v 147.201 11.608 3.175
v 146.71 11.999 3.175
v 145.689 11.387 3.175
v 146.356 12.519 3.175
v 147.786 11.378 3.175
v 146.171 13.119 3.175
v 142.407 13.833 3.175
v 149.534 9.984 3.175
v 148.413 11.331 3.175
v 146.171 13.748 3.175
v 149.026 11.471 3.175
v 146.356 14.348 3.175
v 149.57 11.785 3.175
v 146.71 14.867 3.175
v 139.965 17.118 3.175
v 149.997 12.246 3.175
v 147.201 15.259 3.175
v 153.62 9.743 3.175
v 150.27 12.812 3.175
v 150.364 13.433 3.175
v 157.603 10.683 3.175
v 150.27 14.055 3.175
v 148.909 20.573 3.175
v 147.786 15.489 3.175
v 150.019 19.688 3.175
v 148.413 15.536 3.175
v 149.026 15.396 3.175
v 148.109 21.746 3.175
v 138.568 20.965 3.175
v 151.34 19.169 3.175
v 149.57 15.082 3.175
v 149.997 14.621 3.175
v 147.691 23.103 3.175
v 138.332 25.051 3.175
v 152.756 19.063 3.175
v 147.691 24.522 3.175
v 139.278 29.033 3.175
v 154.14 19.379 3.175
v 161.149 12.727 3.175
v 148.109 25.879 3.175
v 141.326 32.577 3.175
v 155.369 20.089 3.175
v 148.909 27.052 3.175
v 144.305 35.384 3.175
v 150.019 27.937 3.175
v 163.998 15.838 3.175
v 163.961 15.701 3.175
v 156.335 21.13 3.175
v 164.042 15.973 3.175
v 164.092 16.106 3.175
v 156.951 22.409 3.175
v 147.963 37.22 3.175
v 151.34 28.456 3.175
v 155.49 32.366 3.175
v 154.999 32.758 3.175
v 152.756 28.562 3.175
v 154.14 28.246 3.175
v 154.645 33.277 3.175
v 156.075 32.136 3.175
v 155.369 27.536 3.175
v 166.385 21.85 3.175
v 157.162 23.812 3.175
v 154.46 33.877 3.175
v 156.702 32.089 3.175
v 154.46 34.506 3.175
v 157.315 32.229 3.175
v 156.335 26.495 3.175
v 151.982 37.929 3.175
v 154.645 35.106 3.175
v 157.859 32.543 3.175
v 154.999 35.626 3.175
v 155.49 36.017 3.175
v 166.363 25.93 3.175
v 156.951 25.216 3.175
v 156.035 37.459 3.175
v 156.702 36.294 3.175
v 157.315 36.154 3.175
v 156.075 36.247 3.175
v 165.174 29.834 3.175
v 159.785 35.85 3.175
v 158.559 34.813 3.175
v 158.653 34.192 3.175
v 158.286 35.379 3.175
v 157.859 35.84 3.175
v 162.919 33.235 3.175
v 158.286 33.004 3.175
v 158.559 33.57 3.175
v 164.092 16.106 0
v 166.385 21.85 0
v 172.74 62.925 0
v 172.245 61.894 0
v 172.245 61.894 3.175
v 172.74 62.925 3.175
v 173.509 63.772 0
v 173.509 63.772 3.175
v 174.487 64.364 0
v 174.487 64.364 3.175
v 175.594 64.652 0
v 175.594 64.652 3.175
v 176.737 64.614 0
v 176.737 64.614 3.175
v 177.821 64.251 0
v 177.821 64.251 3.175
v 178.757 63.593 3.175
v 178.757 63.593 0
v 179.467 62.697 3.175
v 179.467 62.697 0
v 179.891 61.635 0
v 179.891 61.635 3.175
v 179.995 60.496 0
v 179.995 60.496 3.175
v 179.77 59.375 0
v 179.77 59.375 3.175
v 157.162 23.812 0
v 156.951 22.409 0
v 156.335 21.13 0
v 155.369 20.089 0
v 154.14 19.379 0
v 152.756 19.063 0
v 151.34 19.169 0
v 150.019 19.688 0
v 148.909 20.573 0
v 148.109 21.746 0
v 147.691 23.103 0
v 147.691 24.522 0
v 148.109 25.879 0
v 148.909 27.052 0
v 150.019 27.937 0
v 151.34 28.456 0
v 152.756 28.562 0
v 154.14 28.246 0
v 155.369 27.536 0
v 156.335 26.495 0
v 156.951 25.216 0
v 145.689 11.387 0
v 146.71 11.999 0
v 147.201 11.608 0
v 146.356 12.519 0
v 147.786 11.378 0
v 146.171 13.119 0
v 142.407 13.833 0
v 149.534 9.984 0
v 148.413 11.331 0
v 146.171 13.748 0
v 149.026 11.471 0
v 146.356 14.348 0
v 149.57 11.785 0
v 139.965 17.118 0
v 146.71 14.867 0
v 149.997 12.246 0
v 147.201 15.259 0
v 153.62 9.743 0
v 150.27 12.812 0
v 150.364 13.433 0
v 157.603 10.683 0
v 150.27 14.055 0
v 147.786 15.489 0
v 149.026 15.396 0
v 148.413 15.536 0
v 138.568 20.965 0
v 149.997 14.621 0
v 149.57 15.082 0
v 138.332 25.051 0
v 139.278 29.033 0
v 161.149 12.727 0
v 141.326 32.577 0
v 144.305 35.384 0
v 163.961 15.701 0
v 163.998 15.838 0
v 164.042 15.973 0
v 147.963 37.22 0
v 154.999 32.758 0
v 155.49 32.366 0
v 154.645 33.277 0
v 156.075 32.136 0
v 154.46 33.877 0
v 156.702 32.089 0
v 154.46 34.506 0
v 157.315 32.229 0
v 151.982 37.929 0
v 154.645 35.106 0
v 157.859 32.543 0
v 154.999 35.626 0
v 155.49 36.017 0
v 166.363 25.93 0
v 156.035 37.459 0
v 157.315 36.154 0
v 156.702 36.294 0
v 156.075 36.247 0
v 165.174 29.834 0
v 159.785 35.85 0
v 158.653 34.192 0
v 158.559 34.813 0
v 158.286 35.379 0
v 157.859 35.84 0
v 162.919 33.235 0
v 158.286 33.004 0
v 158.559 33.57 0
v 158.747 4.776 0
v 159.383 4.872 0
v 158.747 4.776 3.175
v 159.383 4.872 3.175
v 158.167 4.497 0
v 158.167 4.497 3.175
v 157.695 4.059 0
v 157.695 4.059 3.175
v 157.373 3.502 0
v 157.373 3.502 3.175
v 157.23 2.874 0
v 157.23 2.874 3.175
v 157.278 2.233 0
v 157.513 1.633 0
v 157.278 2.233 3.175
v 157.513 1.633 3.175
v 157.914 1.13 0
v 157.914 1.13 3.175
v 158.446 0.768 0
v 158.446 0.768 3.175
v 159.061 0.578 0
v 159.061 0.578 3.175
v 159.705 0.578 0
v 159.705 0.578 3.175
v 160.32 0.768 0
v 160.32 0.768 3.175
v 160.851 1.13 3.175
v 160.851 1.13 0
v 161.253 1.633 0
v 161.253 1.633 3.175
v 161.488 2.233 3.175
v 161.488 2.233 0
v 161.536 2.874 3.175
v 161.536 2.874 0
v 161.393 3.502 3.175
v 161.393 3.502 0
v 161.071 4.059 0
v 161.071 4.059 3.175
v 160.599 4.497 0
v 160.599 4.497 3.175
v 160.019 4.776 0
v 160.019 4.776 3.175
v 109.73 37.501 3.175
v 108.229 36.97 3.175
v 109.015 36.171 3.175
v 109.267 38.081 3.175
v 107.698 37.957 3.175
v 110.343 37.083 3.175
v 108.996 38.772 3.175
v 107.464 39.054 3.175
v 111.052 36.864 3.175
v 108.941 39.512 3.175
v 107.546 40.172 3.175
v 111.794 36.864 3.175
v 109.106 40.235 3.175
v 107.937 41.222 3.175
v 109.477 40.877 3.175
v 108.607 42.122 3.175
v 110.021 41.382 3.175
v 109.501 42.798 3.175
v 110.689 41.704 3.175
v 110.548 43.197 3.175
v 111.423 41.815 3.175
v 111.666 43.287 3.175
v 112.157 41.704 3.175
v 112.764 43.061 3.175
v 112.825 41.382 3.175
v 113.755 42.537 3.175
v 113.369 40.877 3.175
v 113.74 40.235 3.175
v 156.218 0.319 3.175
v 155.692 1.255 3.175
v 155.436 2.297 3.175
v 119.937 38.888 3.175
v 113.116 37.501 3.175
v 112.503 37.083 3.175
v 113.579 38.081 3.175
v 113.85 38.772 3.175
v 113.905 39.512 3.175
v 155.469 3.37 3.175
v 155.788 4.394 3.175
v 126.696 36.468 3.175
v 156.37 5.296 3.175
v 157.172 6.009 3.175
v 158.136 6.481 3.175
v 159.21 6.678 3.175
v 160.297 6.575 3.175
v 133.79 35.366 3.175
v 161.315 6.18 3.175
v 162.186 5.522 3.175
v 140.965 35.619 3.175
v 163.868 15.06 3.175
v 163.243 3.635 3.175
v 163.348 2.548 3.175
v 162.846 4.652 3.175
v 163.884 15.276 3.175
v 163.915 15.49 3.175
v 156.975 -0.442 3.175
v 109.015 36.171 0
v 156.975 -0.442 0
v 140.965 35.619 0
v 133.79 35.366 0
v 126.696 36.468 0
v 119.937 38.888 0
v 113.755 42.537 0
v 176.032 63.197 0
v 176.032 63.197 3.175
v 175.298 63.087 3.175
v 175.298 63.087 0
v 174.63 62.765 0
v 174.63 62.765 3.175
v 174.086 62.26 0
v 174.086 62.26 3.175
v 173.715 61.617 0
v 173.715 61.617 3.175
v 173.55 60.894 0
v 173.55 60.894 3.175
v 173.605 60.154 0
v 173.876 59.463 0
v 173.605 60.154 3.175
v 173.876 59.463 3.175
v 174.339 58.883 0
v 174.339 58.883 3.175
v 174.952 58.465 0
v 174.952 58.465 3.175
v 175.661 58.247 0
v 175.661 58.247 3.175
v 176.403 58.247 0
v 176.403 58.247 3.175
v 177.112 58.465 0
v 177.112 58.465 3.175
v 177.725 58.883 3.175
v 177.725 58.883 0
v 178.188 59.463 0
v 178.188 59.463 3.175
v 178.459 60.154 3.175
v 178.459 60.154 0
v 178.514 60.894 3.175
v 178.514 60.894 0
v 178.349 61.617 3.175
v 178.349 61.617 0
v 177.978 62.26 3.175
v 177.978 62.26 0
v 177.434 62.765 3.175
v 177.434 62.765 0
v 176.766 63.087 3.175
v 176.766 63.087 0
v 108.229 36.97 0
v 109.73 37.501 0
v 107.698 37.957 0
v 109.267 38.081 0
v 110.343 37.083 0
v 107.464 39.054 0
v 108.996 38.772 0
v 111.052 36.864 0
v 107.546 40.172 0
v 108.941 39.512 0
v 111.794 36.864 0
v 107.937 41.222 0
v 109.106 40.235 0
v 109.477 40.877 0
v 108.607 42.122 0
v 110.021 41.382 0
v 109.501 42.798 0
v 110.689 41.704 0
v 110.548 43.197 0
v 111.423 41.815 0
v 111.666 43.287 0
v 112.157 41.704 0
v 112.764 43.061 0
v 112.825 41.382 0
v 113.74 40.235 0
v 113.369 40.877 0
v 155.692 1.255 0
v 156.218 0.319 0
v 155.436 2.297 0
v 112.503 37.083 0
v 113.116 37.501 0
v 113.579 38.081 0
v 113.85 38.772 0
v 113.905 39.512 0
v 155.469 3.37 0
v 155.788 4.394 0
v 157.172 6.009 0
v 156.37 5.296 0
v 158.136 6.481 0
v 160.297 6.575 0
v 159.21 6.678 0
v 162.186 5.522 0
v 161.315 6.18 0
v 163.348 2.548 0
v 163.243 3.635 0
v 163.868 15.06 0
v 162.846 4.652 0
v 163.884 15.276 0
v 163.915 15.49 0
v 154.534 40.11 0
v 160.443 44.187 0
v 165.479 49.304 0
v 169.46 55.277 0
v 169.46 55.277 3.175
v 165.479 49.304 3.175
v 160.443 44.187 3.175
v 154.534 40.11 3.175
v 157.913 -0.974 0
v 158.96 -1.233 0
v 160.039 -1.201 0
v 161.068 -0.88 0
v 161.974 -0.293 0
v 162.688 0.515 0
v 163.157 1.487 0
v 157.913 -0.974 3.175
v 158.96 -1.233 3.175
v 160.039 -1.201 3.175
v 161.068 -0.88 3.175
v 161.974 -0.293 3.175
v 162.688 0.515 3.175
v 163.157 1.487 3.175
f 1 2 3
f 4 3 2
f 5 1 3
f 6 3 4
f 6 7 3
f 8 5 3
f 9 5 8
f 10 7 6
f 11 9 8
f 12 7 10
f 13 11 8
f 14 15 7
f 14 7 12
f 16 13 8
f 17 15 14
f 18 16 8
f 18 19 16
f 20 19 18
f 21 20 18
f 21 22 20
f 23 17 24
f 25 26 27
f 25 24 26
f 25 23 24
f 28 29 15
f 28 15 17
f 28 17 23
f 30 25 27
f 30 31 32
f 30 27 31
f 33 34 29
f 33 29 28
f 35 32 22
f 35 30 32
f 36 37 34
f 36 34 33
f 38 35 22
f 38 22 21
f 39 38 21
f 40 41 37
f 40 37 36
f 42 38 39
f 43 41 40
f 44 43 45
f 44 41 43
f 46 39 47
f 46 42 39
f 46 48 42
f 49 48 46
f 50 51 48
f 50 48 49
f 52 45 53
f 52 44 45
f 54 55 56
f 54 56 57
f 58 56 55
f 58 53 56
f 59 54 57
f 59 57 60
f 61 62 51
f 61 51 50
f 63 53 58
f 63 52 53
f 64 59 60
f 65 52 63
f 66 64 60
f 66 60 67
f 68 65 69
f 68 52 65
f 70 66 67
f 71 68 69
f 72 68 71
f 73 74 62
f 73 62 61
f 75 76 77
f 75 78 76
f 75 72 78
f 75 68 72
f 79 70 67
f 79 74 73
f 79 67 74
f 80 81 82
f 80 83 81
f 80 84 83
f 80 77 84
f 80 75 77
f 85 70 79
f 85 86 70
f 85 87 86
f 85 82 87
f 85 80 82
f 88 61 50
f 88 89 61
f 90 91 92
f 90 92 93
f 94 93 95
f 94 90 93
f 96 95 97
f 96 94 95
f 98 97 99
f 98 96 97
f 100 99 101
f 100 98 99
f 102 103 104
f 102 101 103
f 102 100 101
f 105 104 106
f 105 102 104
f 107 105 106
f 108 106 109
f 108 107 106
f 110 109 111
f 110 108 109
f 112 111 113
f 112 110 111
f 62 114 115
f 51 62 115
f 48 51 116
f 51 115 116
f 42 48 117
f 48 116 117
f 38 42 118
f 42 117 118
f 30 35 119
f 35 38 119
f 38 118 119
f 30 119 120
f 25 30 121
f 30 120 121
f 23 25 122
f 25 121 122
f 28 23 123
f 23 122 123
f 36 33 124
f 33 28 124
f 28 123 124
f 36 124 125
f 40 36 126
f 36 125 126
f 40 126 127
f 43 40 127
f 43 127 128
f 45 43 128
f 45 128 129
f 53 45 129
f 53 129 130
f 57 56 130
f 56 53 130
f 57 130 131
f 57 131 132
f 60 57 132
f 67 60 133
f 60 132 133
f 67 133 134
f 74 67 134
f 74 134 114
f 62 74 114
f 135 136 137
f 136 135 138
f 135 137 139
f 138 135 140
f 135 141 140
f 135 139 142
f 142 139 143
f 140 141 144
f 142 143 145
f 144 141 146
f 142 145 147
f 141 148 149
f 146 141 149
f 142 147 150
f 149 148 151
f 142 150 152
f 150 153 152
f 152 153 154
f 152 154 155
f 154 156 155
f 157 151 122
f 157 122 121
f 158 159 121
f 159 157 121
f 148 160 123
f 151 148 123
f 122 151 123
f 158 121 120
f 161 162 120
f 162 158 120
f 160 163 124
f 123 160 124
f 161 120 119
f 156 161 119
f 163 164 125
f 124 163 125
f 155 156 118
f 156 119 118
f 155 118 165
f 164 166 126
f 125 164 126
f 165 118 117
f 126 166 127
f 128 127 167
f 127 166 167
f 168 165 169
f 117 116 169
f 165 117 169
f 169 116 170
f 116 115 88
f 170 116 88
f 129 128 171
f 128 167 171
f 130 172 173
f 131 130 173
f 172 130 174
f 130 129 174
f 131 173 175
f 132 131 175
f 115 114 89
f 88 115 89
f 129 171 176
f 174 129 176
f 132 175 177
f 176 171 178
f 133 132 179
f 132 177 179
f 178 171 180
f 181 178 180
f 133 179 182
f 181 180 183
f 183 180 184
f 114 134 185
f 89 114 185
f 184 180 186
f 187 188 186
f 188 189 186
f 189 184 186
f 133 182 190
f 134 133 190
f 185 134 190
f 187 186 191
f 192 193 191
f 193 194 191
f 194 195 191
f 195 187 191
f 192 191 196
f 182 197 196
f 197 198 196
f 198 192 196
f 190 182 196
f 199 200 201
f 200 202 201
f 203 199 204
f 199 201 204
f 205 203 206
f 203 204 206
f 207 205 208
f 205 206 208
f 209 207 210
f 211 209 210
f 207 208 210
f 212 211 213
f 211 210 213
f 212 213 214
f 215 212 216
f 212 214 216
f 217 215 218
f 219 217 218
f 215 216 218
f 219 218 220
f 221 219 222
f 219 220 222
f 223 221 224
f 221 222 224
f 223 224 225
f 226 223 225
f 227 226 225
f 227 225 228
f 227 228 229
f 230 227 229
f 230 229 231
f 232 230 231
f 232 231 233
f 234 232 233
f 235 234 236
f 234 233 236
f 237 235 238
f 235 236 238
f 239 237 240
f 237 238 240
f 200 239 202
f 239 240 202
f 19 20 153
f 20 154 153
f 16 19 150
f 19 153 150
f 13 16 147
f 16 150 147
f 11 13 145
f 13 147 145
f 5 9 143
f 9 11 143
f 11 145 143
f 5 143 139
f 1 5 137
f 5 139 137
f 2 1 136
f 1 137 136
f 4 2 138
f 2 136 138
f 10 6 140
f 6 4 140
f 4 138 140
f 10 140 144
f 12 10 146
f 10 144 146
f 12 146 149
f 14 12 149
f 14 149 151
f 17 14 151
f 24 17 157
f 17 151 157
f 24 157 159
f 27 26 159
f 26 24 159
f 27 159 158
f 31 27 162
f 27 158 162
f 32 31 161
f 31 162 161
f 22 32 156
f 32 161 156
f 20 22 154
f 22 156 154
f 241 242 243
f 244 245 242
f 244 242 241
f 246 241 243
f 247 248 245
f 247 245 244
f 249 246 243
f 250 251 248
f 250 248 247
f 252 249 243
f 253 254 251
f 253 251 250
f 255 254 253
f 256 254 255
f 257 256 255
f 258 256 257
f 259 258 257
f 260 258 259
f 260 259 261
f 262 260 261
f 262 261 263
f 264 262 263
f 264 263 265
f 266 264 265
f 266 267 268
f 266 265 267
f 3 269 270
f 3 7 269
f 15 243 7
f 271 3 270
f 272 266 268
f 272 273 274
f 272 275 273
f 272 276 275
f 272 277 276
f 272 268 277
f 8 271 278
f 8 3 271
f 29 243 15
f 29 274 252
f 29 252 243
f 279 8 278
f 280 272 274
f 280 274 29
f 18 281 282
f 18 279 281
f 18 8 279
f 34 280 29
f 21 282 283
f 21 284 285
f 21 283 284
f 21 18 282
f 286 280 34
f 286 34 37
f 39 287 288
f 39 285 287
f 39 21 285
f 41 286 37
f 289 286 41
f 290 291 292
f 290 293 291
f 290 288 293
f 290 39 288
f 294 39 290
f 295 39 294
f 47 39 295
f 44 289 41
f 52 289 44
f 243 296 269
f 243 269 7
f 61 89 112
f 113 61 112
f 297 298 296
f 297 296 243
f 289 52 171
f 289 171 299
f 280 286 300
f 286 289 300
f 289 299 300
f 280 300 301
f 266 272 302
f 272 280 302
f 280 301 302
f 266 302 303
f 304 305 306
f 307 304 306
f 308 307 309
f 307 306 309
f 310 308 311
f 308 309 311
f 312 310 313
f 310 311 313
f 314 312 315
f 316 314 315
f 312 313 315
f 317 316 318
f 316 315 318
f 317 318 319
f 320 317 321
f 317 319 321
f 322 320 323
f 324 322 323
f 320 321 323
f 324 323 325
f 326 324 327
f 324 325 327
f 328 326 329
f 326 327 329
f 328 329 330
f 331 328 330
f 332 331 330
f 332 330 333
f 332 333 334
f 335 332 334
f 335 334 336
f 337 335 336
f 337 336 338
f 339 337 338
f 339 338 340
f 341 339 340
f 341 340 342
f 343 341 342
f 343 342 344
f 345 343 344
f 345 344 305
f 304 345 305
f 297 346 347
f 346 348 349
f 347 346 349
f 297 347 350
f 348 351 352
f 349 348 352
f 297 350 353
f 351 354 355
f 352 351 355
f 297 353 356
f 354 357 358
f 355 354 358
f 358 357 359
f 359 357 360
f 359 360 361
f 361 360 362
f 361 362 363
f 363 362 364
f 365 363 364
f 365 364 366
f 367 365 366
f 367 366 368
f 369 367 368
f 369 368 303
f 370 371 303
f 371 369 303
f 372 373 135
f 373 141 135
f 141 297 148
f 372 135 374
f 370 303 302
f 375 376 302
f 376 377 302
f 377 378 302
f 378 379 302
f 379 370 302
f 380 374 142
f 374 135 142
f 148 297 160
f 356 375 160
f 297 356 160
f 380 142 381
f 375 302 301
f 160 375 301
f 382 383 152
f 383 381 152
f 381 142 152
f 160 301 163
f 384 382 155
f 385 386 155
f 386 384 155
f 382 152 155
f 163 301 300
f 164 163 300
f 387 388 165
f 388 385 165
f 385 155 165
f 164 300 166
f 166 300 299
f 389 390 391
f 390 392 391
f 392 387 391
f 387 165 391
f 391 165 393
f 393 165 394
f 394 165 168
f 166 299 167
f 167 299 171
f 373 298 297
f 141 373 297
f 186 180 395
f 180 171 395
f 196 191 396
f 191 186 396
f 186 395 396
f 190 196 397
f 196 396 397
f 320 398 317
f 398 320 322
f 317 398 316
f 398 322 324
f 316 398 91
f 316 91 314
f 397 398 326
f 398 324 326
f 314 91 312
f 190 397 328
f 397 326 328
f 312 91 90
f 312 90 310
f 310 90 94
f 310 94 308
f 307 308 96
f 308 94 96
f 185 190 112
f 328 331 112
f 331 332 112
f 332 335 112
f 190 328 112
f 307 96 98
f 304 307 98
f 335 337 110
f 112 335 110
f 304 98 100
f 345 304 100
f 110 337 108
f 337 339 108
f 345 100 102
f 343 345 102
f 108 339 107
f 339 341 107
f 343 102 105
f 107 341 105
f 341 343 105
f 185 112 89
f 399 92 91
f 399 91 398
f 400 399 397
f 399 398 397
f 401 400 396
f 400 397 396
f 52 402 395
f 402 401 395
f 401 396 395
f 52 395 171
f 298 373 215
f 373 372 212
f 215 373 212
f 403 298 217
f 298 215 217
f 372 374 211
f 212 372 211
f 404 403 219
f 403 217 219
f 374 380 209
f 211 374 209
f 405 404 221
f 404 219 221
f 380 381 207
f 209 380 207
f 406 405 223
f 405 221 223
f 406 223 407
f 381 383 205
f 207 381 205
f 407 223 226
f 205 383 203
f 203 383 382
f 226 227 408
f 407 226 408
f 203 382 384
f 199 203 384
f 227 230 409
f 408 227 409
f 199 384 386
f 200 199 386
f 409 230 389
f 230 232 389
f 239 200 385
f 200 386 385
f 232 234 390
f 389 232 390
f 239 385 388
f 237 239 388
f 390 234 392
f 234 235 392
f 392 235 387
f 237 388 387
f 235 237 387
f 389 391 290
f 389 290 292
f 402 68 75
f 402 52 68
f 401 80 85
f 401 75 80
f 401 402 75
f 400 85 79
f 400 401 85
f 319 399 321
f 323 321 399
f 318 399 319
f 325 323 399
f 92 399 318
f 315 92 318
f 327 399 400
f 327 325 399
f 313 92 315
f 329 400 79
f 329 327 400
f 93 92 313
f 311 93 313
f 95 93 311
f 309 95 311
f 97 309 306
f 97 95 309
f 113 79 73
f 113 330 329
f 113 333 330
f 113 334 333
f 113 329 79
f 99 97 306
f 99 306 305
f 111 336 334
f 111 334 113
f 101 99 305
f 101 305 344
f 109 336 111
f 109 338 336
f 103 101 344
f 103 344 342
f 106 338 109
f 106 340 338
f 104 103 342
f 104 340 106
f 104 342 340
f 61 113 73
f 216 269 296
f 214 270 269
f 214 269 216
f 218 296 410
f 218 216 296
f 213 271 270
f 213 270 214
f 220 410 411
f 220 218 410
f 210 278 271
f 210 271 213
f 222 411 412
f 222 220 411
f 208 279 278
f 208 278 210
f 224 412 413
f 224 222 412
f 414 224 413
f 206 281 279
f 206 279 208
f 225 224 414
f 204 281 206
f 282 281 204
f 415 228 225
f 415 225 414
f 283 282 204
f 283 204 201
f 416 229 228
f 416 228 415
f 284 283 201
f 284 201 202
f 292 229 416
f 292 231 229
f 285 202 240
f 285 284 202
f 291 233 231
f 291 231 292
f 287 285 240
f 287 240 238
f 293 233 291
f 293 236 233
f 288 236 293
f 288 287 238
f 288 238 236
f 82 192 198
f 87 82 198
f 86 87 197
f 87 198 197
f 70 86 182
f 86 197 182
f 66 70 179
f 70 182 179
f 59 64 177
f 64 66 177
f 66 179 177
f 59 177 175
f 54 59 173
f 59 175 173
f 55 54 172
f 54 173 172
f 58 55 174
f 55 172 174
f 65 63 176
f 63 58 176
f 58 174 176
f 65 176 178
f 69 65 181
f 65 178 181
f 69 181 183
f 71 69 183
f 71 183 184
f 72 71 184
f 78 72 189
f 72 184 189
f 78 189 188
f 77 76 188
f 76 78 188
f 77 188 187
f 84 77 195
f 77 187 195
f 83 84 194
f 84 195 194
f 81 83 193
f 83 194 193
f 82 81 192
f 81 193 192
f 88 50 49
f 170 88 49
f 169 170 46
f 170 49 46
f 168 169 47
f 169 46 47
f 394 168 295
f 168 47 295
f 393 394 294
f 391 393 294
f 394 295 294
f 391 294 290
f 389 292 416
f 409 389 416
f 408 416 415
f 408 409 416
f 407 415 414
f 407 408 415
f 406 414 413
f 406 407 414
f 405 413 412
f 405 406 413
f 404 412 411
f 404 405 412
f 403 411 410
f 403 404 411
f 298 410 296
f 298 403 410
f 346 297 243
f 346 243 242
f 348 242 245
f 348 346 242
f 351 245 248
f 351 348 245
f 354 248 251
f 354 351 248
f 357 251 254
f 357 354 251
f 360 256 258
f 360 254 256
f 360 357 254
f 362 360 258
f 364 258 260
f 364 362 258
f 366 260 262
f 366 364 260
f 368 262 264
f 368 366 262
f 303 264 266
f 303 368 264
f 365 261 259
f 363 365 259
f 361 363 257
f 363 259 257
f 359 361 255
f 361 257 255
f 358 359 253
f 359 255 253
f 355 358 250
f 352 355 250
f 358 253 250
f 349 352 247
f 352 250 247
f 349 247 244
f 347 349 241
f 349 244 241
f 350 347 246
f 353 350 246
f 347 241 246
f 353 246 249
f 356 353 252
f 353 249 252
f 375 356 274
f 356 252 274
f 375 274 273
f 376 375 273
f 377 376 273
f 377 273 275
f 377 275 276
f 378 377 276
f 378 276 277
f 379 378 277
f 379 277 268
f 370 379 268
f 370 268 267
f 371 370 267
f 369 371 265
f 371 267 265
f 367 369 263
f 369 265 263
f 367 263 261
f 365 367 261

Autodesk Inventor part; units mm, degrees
ref_plane "YZ Plane" through (0, 0, 0) normal (1, 0, 0) x (0, 1, 0)
ref_plane "XZ Plane" through (0, 0, 0) normal (0, 1, 0) x (-1, 0, 0)
ref_plane "XY Plane" through (0, 0, 0) normal (0, 0, 1) x (1, 0, 0)
sketch "Sketch1" plane through (0, 0, 0) normal (0, 0, 1) x (1, 0, 0)
  line L0 (0, 0) -> (304.8, 0) construction
  line L1 (304.8, 0) -> (304.8, 50.8) construction
  line L2 (304.8, 50.8) -> (0, 50.8) construction
  line L3 (0, 50.8) -> (0, 0) construction
  circle A0 centre (152.4, 23.8125) radius 6.35 construction
  circle A1 centre (152.4, 23.8125) radius 34.29 construction
  circle A2 centre (152.4, 23.8125) radius 22.225 construction
  line L4 (152.4, 23.8125) -> (139.8147, 61.8398) construction
  circle A3 centre (139.8147, 61.8398) radius 9.525 construction
  circle A4 centre (139.8147, 61.8398) radius 17.78 construction
  circle A5 centre (91.4913, 85.598) radius 32.258 construction
  circle A6 centre (164.4242, 109.7354) radius 32.258 construction
  line L5 (0, 50.8) -> (0, 53.34) construction
  line L6 (0, 53.34) -> (304.8, 53.34) construction
  line L7 (304.8, 53.34) -> (304.8, 50.8) construction
  circle A7 centre (139.8147, 61.8398) radius 21.59 construction
  circle A8 centre (152.4, 23.8125) radius 46.99 construction
  circle A9 centre (152.4, 23.8125) radius 50.8 construction
  arc A10 (86.31, 79.9698) -> (92.3737, 93.1969) centre (91.4913, 85.598) ccw construction
  circle A11 centre (164.4242, 109.7354) radius 7.65 construction
  circle A12 centre (164.4242, 109.7354) radius 9.1 construction
  circle A13 centre (139.8147, 61.8398) radius 22.9 construction
  line L8 (86.31, 79.9698) -> (124.3047, 44.992) construction
  line L9 (171.9401, 108.3093) -> (162.3134, 57.5711) construction
  line L10 (92.3737, 93.1969) -> (91.4913, 85.598) construction
  line L11 (91.4913, 85.598) -> (86.31, 79.9698) construction
  arc A14 (129.415, 93.2634) -> (131.9683, 98.1756) centre (128.1681, 97.0312) ccw
  circle A15 centre (128.1681, 97.0312) radius 7.9375 construction
  line L12 (92.3737, 93.1969) -> (127.2525, 89.1467) construction
  line L13 (133.6065, 91.2495) -> (159.1828, 115.3076) construction
  line L14 (159.1828, 115.3076) -> (164.4242, 109.7354) construction
  line L15 (171.9401, 108.3093) -> (164.4242, 109.7354) construction
  line L16 (139.8147, 61.8398) -> (128.1681, 97.0312) construction
  line L17 (91.4913, 85.598) -> (164.4242, 109.7354) construction
  line L18 (152.4, 23.8125) -> (91.4913, 85.598) construction
  line L19 (152.4, 23.8125) -> (164.4242, 109.7354) construction
  circle A16 centre (128.1681, 97.0312) radius 9.2075 construction
  circle A17 centre (128.1681, 97.0312) radius 6.1595 construction
  arc A18 (92.3737, 93.1969) -> (86.31, 79.9698) centre (91.4913, 85.598) ccw construction
  circle A19 centre (164.4242, 109.7354) radius 25.4 construction
  line L20 (104.9341, 114.9215) -> (78.0485, 56.2745) construction
  circle A20 centre (91.4913, 85.598) radius 25.4 construction
  line L21 (104.3539, 107.5736) -> (92.6302, 85.0411) construction
  line L22 (80.9064, 62.5086) -> (90.326, 86.0974) construction
  arc A21 (100.6288, 111.8976) -> (98.8626, 107.4747) centre (99.7457, 109.6862) ccw construction
  arc A22 (103.2548, 105.4612) -> (105.453, 109.686) centre (104.3539, 107.5736) ccw construction
  arc A23 (103.2548, 105.4612) -> (98.8626, 107.4747) centre (80.9064, 62.5086) ccw construction
  line L23 (99.7457, 109.6862) -> (100.6288, 111.8976) construction
  line L24 (104.3539, 107.5736) -> (105.453, 109.686) construction
  arc A24 (105.453, 109.686) -> (100.6288, 111.8976) centre (80.9064, 62.5086) ccw construction
  arc A25 (87.9407, 76.0281) -> (97.3197, 94.0541) centre (92.6302, 85.0411) ccw construction
  line L25 (90.326, 86.0974) -> (99.7457, 109.6862) construction
  line L26 (92.6302, 85.0411) -> (80.9064, 62.5086) construction
  arc A26 (87.9407, 76.0281) -> (86.5582, 76.6619) centre (80.9064, 62.5086) ccw construction
  arc A27 (97.3197, 94.0541) -> (94.0939, 95.5329) centre (80.9064, 62.5086) ccw construction
  arc A28 (94.0939, 95.5329) -> (86.5582, 76.6619) centre (90.326, 86.0974) ccw construction
  line L27 (164.4242, 109.7354) -> (142.1549, 121.9516) construction
  line L28 (164.4242, 109.7354) -> (186.6936, 97.5192) construction
  circle A29 centre (139.8147, 61.8398) radius 26.71 construction
  circle A30 centre (152.4, 23.8125) radius 11.176 construction
  line L29 (152.4, 23.8125) -> (159.3829, 2.713) construction
  circle A31 centre (152.4, 23.8125) radius 4.7625
  line L30 (156.5446, 34.1916) -> (148.2554, 13.4334) construction
  circle A32 centre (156.5446, 34.1916) radius 2.1082
  circle A33 centre (148.2554, 13.4334) radius 2.1082
  arc A34 (166.3853, 21.8496) -> (163.8906, 15.6022) centre (152.4, 23.8125) ccw
  circle A35 centre (111.4232, 39.3255) radius 9.525 construction
  circle A36 centre (176.0321, 60.708) radius 9.525 construction
  arc A37 (113.755, 42.537) -> (109.015, 36.1709) centre (111.4232, 39.3255) ccw
  arc A38 (179.7701, 59.3747) -> (172.2448, 61.8944) centre (176.0321, 60.708) ccw
  arc A39 (158.136, 6.4808) -> (156.9747, -0.4416) centre (159.3829, 2.713) ccw
  line L31 (152.4, 23.8125) -> (165.1379, 18.7259) construction
  line L32 (166.3853, 21.8496) -> (163.8906, 15.6022)
  arc A40 (163.8906, 15.6022) -> (166.3853, 21.8496) centre (152.4, 23.8125) ccw construction
  line L33 (163.8906, 15.6022) -> (163.3483, 2.5483)
  line L34 (156.9747, -0.4416) -> (109.015, 36.1709)
  line L35 (166.3853, 21.8496) -> (179.7701, 59.3747)
  arc A41 (124.3867, 95.8262) -> (129.415, 93.2634) centre (128.1681, 97.0312) ccw
  arc A42 (131.9683, 98.1756) -> (124.3867, 95.8262) centre (128.1681, 97.0312) ccw
  arc A43 (131.7101, 98.9085) -> (131.9683, 98.1756) centre (178.947, 115.132) ccw
  arc A44 (163.3483, 2.5483) -> (158.136, 6.4808) centre (159.3829, 2.713) ccw
  arc A45 (156.9747, -0.4416) -> (163.3483, 2.5483) centre (159.3829, 2.713) ccw
  circle A46 centre (136.0438, 73.2342) radius 37.9355
  point P0 (102.0762, 108.6874)
  point P1 (145.0256, 46.8513)
  dimension "d1" = 50.8
  dimension "d3" = 23.8125
  dimension "d4" = 152.4
  dimension "d7" = 68.58
  dimension "d8" = 44.45
  dimension "d9" = 19.05
  dimension "d10" = 35.56
  dimension "d11" = 40.0558
  dimension "d12" = 64.516
  dimension "d13" = 64.516
  dimension "d15" = 2.54
  dimension "d16" = 304.8
  dimension "d17" = 43.18
  dimension "d18" = 93.98
  dimension "d19" = 101.6
  dimension "d21" = 15.3
  dimension "d22" = 15.3
  dimension "d24" = 18.2
  dimension "d29" = 45.8
  dimension "d30" = 143.991
  dimension "d31" = 7.9375
  dimension "d32" = 15.875
  dimension "d33" = 143.991
  dimension "d35" = 18.415
  dimension "d37" = 12.319
  dimension "d40" = 50.8
  dimension "d42" = 18.004
  dimension "d43" = 18.004
  dimension "d44" = 50.8
  dimension "d75" = 2.86
  dimension "d80" = 4.7625
  dimension "d82" = 4.7625
  dimension "d83" = 50.8
  dimension "d84" = 50.8
  dimension "d97" = 48.4188
  dimension "d99" = 20.32
  dimension "d101" = 25.4
  dimension "d102" = 25.4
  dimension "d103" = 10.16
  dimension "d105" = 18.004
  dimension "d106" = 18.004
  dimension "d107" = 53.42
  dimension "d149" = 22.352
  dimension "d152" = 180
  dimension "d163" = 9.525
  dimension "d190" = 12.7
  dimension "d191" = 4.2164
  dimension "d192" = 4.2164
  dimension "d209" = 28.2448
  dimension "d210" = 19.05
  dimension "d211" = 19.05
  dimension "d212" = 7.9375
  dimension "d214" = 22.225
  dimension "d215" = 7.9375
  dimension "d216" = 13.716
  dimension "d232" = 3.9688
extrude "Extrusion3" add sketch "Sketch1" along normal blind 3.175 contours L32 A34 | A34 A46 A38 L35 | A34 L33 A44 A39 L34 A37 A46 | A45 A39 A44
hole "Hole3" at (80.9064, 62.5086, 0) at (186.6936, 97.5192, 0) at (128.1681, 97.0312, 0) at (111.4232, 39.3255, 0) at (176.0321, 60.708, 0) direction (0, 0, 1) diameter 4.9784 end through all clearance for "Socket Head Cap Screw" size "#10" standard "Ansi Unified Screw Threads"
fillet "Fillet3" radius 3.175 2 edges at (166.3853, 21.8496, 1.5875) (163.8906, 15.6022, 1.5875)
hole "Hole6" at (159.3829, 2.713, 0) direction (0, 0, 1) diameter 4.318 end through all clearance for "Socket Head Cap Screw" size "#8" standard "Ansi Unified Screw Threads"
equation "\"d8\" = Gear35tPD"
equation "\"d9\" = Gear15tPD"
equation "\"d10\" = Gear28tPD"
equation "\"d11\" = 0.5 * Gear48tPD + 0.5 * Gear15tPD + MeshingClearance"
equation "\"d12\" = CimOD"
equation "\"d13\" = CimOD"
equation "\"d17\" = Gear28tPD + ClearanceDiameter"
equation "\"d18\" = WheelOD"
equation "\"d19\" = WheelClearance"
equation "\"Pulley48tPD\" = 45.8"
equation "\"Pulley19tPD\" = 18.2"
equation "\"Pulley16tPD\" = 15.3"
equation "\"Gear15tPD\" = 19.05"
equation "\"Gear35tPD\" = 44.45"
equation "\"Gear48tPD\" = 60.96"
equation "\"Gear28tPD\" = 35.56"
equation "\"BearingLargeOD\" = 28.575"
equation "\"BearingSmallOD\" = 22.225"
equation "\"MeshingClearance\" = 0.0508"
equation "\"CimOD\" = 64.516"
equation "\"WheelOD\" = 93.98"
equation "\"ClearanceDiameter\" = 7.62"
equation "\"WheelClearance\" = 101.6"
equation "\"TensioningBearingID\" = 6.35"
equation "\"TensioningBearingOD\" = 15.875"
equation "\"SpingClipClearance\" = 8.89"
equation "\"Pi\" = 79.79645"
equation "\"Pulley56tPD\" = 53.5"
equation "\"BearingXLargeOD\" = 34.925"
properties part number "OutlineSketch1" material "Aluminum 6061"
